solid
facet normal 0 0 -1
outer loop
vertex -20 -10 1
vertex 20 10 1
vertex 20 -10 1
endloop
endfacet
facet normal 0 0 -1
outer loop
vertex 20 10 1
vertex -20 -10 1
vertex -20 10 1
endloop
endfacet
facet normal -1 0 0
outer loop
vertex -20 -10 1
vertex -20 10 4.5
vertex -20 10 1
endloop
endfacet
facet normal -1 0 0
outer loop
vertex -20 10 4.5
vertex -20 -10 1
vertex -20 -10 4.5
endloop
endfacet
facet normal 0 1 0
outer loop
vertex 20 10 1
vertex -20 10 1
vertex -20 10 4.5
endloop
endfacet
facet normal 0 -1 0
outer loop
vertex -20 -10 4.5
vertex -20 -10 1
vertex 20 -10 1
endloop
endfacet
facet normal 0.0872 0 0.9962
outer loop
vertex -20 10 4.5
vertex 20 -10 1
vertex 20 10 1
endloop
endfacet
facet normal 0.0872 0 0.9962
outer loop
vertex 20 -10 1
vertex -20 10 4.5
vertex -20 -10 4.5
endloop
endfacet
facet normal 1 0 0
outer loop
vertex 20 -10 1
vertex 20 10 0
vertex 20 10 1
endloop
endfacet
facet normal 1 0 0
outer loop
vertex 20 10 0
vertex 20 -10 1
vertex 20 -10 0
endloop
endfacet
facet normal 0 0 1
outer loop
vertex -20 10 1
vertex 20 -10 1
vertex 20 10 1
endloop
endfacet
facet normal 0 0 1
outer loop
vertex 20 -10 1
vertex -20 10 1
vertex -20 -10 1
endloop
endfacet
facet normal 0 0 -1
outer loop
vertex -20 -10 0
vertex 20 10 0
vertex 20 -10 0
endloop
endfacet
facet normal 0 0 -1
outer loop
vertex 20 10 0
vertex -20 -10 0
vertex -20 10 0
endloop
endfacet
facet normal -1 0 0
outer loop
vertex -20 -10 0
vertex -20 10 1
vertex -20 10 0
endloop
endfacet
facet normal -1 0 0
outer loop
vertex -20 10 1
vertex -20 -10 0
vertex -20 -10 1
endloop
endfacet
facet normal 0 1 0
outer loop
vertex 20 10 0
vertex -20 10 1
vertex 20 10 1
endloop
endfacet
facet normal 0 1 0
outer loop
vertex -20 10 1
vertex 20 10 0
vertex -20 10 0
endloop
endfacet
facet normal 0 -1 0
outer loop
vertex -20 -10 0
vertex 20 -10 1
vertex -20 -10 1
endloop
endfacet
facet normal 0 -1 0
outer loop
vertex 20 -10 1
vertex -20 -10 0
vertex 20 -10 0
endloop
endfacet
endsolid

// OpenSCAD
include <BOSL/constants.scad>;
use <BOSL/transforms.scad>
use <BOSL/shapes.scad>;
$fa = 1;
$fs = 0.4;

module wedge(angle = 5) {
    length = 40;
    b = length;
    c = b / cos(angle);
    a = sqrt(pow(c, 2) - pow(b, 2));

    l = length;
    w = 20;
    base_height = 1;

    up(base_height) right_triangle([l,w,a], align=[0,0,1]);
    cuboid([l,w,base_height], align=1);
}

wedge(angle=5);

//up(30) yrot(45) cuboid([20,20,20]);


//color("red") translate([19.6393,-8.87118,1]) cuboid([1,1,1], align=1);
//color("red") translate([0,0,1.37322+0.5]) cuboid([1,1,1], align=1);
